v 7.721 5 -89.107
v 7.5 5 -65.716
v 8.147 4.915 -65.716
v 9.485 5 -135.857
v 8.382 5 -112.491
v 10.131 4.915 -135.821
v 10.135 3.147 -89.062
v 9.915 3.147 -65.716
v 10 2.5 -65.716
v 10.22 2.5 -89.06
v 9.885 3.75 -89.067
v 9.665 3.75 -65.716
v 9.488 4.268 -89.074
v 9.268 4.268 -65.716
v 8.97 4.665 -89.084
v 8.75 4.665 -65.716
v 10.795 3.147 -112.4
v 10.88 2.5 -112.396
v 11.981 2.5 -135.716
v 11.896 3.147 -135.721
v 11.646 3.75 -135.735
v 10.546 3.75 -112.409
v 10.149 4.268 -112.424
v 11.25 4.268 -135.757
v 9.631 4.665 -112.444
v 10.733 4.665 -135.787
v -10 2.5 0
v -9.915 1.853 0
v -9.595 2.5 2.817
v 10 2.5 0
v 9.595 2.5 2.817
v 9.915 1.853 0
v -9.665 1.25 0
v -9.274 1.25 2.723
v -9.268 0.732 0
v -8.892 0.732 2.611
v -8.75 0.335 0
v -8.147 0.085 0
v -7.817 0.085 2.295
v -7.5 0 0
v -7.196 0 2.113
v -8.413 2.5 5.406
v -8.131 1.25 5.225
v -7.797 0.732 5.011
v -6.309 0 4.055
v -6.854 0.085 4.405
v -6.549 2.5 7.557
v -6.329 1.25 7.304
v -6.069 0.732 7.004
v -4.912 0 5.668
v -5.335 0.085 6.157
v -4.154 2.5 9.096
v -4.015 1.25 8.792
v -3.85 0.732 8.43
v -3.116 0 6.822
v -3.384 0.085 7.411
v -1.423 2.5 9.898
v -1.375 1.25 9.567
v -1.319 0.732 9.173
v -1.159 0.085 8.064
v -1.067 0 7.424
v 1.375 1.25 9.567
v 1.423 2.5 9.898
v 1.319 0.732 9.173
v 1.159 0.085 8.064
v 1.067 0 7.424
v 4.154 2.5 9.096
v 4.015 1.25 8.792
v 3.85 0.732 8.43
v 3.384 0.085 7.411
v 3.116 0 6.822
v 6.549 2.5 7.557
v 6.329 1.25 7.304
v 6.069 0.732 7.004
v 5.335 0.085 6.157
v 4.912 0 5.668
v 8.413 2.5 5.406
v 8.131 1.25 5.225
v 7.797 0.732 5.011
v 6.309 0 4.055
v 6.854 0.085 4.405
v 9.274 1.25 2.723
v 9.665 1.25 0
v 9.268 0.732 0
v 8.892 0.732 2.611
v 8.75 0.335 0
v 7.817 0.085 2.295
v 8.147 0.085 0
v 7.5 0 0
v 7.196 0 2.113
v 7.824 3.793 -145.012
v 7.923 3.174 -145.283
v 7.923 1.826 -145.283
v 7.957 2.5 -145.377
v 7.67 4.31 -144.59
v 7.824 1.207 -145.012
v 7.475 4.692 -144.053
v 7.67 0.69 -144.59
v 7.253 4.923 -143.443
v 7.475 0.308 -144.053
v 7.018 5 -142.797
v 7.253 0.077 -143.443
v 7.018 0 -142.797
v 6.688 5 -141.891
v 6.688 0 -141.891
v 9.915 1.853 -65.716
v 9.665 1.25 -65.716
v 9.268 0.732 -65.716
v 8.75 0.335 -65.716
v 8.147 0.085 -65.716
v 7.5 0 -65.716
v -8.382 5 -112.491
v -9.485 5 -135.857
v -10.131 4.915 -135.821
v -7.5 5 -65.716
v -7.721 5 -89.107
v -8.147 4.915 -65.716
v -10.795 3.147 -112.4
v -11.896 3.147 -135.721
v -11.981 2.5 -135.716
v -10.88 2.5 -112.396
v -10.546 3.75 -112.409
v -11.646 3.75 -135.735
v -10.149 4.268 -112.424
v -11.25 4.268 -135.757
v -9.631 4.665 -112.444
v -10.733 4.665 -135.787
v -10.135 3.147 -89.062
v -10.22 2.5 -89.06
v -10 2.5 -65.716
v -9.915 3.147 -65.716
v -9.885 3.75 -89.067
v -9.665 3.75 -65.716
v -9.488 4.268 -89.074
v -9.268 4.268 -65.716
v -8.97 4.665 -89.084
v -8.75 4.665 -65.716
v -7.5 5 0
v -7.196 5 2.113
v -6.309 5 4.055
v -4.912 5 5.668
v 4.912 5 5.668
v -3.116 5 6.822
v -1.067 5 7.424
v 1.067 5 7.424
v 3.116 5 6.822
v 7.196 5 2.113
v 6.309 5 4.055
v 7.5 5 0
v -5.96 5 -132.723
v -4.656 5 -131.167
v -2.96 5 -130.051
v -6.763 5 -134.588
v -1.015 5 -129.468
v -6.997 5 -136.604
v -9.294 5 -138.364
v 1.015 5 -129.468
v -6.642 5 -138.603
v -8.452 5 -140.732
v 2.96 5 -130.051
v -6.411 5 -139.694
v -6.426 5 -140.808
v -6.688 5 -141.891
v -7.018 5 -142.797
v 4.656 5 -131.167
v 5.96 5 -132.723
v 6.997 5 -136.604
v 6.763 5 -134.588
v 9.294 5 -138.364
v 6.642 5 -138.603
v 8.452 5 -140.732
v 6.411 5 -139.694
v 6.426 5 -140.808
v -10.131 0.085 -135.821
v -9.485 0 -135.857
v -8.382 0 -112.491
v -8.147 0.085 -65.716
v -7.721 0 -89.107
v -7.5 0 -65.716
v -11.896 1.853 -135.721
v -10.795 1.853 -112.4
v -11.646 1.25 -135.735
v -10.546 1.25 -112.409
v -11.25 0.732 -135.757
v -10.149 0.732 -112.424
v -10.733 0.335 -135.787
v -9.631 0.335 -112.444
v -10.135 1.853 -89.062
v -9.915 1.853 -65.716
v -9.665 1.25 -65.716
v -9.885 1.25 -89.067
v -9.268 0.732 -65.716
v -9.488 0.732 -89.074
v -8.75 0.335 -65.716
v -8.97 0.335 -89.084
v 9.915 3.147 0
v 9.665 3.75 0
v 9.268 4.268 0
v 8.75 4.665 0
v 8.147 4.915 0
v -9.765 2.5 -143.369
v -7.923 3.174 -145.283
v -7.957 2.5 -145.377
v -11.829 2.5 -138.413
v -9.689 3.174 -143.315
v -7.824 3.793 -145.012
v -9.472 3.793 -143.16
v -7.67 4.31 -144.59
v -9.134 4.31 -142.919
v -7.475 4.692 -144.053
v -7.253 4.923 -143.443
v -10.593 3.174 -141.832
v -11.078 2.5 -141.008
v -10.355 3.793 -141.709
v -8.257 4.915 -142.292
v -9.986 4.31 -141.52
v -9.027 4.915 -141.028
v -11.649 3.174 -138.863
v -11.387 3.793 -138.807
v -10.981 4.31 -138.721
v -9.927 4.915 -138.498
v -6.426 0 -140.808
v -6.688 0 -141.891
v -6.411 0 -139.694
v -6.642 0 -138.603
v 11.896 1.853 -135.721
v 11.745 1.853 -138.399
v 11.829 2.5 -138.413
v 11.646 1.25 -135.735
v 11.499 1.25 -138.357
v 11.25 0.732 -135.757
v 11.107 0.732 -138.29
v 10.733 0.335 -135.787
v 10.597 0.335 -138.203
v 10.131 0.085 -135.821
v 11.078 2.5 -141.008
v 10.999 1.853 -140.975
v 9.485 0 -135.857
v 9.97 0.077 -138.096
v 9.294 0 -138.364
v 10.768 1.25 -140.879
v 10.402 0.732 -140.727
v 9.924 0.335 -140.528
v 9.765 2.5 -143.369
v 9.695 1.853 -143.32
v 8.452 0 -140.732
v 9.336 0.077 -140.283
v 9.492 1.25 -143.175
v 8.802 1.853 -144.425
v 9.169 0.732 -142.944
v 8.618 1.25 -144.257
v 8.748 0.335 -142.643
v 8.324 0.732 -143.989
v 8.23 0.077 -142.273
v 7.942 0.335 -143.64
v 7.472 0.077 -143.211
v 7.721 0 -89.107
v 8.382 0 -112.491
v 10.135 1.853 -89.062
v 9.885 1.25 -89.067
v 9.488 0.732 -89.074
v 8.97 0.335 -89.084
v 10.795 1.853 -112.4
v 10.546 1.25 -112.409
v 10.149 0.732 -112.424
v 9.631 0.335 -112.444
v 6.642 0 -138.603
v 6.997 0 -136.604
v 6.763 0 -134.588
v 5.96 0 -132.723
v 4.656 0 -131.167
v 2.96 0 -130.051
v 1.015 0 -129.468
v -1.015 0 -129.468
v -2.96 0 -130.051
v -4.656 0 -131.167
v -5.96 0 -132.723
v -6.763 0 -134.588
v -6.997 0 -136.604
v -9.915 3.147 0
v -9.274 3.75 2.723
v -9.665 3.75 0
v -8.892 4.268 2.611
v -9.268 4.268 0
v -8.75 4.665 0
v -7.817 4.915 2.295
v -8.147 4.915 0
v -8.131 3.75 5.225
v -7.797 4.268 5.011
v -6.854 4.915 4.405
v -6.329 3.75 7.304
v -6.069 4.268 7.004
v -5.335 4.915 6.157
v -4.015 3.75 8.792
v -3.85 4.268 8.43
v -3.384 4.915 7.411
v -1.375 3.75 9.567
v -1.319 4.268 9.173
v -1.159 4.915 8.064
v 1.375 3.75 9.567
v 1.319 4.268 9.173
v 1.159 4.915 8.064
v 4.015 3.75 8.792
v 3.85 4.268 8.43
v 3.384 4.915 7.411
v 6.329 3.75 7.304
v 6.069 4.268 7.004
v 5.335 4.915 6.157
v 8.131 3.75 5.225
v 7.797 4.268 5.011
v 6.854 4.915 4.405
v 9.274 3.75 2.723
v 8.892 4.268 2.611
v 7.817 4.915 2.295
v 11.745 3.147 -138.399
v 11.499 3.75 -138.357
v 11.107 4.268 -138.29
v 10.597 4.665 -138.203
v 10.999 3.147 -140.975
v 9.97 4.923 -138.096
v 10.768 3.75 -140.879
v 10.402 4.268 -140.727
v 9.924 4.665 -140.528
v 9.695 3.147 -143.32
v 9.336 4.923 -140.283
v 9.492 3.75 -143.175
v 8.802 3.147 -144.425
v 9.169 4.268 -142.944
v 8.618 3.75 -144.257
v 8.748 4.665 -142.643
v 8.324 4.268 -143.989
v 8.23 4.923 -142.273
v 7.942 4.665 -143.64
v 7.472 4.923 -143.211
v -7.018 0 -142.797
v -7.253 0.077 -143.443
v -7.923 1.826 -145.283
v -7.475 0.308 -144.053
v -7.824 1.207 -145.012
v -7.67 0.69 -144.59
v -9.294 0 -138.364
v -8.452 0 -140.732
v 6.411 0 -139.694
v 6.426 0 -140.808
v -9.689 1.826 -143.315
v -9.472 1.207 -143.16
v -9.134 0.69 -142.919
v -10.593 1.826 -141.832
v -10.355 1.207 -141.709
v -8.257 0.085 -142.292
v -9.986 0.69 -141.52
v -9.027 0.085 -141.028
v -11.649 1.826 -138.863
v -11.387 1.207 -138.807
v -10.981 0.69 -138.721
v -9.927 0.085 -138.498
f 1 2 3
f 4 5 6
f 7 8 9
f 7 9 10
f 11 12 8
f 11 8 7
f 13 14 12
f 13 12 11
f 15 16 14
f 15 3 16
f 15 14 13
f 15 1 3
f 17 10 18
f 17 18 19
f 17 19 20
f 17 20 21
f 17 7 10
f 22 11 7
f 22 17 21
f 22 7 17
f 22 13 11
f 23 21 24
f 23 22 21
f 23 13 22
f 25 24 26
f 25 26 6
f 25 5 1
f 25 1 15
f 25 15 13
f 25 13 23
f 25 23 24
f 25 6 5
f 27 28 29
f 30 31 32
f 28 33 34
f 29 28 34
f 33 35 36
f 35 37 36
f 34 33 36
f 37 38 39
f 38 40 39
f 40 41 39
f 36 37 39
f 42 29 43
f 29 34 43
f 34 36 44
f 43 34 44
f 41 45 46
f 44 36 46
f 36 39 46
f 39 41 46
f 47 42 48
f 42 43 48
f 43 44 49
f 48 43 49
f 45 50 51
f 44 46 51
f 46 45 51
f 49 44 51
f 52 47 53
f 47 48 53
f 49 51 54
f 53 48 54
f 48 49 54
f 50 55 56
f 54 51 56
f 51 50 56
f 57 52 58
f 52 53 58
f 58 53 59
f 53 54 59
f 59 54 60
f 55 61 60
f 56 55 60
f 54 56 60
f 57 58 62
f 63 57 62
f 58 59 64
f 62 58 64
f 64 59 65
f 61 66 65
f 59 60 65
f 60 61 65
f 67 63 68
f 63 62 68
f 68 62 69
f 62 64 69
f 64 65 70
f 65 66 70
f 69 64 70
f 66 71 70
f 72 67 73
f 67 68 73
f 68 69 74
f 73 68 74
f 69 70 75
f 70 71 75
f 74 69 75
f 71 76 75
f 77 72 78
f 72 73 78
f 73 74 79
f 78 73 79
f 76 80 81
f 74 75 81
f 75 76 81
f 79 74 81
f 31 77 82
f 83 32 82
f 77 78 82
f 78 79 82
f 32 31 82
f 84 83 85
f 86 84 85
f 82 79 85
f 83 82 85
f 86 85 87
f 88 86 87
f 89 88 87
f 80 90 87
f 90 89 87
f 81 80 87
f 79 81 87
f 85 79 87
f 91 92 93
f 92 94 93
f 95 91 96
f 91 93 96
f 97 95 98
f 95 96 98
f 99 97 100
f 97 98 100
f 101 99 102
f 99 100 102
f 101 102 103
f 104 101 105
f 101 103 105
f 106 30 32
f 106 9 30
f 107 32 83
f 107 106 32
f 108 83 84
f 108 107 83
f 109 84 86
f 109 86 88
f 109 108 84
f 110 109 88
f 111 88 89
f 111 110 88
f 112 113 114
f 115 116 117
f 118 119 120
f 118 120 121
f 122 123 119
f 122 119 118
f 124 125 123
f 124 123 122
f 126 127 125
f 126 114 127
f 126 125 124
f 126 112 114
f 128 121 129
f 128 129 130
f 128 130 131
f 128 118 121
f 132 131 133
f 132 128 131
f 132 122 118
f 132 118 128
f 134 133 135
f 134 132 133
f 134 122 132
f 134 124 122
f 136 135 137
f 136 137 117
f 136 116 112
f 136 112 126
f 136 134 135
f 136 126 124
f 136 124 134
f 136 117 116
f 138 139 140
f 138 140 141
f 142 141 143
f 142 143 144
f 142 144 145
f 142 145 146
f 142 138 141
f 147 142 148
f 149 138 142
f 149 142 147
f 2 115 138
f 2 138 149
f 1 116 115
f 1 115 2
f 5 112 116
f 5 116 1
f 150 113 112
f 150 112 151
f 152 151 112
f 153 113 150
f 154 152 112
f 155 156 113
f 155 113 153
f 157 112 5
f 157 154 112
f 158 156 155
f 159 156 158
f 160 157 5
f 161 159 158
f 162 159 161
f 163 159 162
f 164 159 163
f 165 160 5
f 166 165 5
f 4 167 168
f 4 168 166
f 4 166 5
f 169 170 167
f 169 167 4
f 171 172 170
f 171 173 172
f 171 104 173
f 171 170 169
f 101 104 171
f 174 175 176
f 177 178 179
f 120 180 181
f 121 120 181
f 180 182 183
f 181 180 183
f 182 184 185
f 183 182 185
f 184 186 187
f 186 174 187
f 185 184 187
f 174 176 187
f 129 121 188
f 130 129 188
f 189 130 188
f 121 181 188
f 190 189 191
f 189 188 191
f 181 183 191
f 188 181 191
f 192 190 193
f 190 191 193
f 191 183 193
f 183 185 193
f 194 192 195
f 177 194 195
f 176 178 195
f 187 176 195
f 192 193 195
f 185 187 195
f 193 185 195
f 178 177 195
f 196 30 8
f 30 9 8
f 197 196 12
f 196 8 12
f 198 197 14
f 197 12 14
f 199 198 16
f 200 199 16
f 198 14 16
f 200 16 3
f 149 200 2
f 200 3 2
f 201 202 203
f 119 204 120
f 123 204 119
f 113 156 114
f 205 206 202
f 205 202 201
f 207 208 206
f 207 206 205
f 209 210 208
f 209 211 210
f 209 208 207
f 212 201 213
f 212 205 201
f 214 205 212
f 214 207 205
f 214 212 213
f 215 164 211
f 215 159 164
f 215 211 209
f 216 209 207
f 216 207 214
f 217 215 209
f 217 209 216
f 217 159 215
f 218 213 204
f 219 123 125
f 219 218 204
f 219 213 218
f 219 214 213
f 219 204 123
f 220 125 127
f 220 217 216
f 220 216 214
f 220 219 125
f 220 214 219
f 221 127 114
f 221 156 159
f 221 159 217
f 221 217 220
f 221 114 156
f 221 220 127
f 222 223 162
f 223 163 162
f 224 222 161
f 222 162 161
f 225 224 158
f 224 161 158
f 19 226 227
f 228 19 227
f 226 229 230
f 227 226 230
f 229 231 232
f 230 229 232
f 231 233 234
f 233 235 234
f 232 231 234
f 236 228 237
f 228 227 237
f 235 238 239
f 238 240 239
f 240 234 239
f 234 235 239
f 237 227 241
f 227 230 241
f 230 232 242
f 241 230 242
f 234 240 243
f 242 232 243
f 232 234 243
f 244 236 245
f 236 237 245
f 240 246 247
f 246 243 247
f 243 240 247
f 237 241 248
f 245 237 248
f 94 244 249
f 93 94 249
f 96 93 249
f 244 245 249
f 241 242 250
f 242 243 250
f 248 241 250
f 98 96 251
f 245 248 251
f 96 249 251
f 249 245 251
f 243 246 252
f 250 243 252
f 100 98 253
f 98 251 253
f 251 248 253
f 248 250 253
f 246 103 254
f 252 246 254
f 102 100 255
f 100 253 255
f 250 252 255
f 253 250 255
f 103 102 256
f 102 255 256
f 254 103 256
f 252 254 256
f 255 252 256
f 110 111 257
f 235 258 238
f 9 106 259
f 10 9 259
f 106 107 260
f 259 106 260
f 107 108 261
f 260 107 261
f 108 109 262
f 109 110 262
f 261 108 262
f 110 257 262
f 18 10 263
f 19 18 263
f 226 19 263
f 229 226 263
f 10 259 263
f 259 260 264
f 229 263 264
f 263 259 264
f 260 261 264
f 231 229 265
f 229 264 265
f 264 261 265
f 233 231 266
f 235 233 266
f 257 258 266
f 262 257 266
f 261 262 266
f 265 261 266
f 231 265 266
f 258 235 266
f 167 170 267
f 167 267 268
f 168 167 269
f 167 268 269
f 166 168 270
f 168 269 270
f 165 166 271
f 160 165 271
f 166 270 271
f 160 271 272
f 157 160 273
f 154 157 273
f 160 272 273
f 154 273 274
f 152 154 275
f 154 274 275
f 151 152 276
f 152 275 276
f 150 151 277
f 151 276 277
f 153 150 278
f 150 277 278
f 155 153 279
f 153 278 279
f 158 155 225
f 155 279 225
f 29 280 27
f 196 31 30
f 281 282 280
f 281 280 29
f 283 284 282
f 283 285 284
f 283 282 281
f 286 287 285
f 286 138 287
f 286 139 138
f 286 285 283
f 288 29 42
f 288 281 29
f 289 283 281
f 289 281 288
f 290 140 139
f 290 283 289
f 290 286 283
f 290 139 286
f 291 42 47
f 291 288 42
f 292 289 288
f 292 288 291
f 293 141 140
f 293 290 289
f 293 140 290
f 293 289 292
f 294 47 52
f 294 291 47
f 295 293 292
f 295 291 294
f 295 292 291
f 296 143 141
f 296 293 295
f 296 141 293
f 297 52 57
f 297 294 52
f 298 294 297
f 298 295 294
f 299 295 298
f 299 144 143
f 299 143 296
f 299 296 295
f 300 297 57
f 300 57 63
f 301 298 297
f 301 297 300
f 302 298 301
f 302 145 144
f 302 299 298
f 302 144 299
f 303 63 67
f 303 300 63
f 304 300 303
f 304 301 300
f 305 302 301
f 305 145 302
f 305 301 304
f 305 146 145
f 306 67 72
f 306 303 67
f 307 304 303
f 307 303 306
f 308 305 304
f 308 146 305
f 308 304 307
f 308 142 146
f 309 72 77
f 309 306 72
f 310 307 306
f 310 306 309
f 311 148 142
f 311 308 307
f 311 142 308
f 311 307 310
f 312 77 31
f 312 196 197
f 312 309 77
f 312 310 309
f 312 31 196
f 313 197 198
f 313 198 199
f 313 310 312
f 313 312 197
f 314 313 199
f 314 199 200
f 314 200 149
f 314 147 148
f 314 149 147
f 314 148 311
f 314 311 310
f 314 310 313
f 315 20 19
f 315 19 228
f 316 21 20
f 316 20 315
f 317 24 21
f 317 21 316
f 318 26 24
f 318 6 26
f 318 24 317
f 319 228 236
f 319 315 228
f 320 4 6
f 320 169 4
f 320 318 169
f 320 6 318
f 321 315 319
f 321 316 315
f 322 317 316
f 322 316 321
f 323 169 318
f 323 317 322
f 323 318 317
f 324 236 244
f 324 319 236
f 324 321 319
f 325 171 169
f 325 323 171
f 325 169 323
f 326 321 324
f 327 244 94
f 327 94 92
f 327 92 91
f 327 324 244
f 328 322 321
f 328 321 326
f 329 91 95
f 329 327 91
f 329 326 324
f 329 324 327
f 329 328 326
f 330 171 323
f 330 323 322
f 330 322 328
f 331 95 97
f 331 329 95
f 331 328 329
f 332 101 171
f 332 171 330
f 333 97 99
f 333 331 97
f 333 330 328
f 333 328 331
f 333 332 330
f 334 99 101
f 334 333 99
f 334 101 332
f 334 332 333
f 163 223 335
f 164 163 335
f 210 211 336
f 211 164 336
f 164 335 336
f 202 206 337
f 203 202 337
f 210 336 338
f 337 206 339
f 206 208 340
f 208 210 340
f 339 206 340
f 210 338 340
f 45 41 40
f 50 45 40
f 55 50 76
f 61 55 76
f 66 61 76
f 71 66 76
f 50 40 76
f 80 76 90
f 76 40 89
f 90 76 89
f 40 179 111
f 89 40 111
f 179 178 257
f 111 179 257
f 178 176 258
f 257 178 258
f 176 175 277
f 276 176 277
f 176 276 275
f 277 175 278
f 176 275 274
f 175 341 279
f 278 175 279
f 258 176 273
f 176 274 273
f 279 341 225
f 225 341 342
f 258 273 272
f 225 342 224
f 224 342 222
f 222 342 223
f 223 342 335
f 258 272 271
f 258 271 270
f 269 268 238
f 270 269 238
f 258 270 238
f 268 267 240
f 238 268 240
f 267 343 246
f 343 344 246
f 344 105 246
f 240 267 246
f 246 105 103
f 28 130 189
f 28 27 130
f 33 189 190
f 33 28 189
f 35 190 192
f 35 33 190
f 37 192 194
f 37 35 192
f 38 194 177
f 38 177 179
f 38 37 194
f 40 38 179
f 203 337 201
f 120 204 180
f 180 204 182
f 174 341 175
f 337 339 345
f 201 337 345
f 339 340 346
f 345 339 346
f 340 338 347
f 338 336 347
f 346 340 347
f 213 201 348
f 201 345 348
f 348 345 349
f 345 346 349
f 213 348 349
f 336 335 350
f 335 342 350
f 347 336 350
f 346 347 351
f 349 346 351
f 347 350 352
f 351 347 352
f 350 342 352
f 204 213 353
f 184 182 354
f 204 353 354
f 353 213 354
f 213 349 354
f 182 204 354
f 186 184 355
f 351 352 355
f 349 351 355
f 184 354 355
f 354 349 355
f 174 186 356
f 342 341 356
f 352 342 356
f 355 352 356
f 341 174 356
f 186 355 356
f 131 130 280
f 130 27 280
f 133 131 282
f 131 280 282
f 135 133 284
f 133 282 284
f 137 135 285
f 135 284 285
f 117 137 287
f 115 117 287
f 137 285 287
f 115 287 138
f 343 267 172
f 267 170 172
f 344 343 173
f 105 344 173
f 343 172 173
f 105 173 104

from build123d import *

# Parameters (mm, degrees)
BOSS_EXTRUDE1_DEPTH = 5
FILLET1_R           = 2.5
FILLET2_R           = 5


with BuildPart() as part:
    # Sketch1 → Boss-Extrude1 (new body)
    with BuildSketch(Plane(origin=(0, 0, 0), x_dir=(1, 0, 0), z_dir=(0, 1, 0))):
        with BuildLine():
            ThreePointArc((11.980797937, 135.715861366), (0, 124.394448725), (-11.980797937, 135.715861366))
            ThreePointArc((-11.980797937, 135.715861366), (-10.495298574, 100.729871278), (-10, 65.715861366))
            Line((-10, 65.715861366), (-10, 0))
            ThreePointArc((-10, 0), (0, -10), (10, 0))
            Line((10, 0), (10, 65.715861366))
            ThreePointArc((10, 65.715861366), (10.495298574, 100.729871278), (11.980797937, 135.715861366))
        make_face()
        with BuildLine():
            Line((-6, 140), (-7.957050212, 145.376951267))
            ThreePointArc((-7.957050212, 145.376951267), (0, 124.394448725), (7.957050212, 145.376951267))
            Line((7.957050212, 145.376951267), (6, 140))
            ThreePointArc((6, 140), (0, 129.394448725), (-6, 140))
        make_face()
    extrude(amount=BOSS_EXTRUDE1_DEPTH)

    # Fillet1
    fillet1_edges = [part.edges().sort_by_distance(p)[0] for p in [
        (11.077617601, 0, -141.008166128),
        (10.495298574, 0, -100.729871278),
        (10, 0, -32.857930683),
        (0, 0, 10),
        (-10, 0, -32.857930683),
        (-10.495298574, 0, -100.729871278),
        (11.077617601, 5, -141.008166128),
        (10.495298574, 5, -100.729871278),
        (10, 5, -32.857930683),
        (0, 5, 10),
        (-10, 5, -32.857930683),
        (-10.495298574, 5, -100.729871278),
        (-11.077617601, 0, -141.008166128),
        (-11.077617601, 5, -141.008166128),
    ]]
    fillet(fillet1_edges, radius=FILLET1_R - 0.0001)  # a hair under: the kernel refuses the full size

    # Fillet2
    fillet2_edges = [part.edges().sort_by_distance(p)[0] for p in [
        (-6, 2.5, -140),
        (6, 2.5, -140),
    ]]
    fillet(fillet2_edges, radius=FILLET2_R)


solid = part.part
